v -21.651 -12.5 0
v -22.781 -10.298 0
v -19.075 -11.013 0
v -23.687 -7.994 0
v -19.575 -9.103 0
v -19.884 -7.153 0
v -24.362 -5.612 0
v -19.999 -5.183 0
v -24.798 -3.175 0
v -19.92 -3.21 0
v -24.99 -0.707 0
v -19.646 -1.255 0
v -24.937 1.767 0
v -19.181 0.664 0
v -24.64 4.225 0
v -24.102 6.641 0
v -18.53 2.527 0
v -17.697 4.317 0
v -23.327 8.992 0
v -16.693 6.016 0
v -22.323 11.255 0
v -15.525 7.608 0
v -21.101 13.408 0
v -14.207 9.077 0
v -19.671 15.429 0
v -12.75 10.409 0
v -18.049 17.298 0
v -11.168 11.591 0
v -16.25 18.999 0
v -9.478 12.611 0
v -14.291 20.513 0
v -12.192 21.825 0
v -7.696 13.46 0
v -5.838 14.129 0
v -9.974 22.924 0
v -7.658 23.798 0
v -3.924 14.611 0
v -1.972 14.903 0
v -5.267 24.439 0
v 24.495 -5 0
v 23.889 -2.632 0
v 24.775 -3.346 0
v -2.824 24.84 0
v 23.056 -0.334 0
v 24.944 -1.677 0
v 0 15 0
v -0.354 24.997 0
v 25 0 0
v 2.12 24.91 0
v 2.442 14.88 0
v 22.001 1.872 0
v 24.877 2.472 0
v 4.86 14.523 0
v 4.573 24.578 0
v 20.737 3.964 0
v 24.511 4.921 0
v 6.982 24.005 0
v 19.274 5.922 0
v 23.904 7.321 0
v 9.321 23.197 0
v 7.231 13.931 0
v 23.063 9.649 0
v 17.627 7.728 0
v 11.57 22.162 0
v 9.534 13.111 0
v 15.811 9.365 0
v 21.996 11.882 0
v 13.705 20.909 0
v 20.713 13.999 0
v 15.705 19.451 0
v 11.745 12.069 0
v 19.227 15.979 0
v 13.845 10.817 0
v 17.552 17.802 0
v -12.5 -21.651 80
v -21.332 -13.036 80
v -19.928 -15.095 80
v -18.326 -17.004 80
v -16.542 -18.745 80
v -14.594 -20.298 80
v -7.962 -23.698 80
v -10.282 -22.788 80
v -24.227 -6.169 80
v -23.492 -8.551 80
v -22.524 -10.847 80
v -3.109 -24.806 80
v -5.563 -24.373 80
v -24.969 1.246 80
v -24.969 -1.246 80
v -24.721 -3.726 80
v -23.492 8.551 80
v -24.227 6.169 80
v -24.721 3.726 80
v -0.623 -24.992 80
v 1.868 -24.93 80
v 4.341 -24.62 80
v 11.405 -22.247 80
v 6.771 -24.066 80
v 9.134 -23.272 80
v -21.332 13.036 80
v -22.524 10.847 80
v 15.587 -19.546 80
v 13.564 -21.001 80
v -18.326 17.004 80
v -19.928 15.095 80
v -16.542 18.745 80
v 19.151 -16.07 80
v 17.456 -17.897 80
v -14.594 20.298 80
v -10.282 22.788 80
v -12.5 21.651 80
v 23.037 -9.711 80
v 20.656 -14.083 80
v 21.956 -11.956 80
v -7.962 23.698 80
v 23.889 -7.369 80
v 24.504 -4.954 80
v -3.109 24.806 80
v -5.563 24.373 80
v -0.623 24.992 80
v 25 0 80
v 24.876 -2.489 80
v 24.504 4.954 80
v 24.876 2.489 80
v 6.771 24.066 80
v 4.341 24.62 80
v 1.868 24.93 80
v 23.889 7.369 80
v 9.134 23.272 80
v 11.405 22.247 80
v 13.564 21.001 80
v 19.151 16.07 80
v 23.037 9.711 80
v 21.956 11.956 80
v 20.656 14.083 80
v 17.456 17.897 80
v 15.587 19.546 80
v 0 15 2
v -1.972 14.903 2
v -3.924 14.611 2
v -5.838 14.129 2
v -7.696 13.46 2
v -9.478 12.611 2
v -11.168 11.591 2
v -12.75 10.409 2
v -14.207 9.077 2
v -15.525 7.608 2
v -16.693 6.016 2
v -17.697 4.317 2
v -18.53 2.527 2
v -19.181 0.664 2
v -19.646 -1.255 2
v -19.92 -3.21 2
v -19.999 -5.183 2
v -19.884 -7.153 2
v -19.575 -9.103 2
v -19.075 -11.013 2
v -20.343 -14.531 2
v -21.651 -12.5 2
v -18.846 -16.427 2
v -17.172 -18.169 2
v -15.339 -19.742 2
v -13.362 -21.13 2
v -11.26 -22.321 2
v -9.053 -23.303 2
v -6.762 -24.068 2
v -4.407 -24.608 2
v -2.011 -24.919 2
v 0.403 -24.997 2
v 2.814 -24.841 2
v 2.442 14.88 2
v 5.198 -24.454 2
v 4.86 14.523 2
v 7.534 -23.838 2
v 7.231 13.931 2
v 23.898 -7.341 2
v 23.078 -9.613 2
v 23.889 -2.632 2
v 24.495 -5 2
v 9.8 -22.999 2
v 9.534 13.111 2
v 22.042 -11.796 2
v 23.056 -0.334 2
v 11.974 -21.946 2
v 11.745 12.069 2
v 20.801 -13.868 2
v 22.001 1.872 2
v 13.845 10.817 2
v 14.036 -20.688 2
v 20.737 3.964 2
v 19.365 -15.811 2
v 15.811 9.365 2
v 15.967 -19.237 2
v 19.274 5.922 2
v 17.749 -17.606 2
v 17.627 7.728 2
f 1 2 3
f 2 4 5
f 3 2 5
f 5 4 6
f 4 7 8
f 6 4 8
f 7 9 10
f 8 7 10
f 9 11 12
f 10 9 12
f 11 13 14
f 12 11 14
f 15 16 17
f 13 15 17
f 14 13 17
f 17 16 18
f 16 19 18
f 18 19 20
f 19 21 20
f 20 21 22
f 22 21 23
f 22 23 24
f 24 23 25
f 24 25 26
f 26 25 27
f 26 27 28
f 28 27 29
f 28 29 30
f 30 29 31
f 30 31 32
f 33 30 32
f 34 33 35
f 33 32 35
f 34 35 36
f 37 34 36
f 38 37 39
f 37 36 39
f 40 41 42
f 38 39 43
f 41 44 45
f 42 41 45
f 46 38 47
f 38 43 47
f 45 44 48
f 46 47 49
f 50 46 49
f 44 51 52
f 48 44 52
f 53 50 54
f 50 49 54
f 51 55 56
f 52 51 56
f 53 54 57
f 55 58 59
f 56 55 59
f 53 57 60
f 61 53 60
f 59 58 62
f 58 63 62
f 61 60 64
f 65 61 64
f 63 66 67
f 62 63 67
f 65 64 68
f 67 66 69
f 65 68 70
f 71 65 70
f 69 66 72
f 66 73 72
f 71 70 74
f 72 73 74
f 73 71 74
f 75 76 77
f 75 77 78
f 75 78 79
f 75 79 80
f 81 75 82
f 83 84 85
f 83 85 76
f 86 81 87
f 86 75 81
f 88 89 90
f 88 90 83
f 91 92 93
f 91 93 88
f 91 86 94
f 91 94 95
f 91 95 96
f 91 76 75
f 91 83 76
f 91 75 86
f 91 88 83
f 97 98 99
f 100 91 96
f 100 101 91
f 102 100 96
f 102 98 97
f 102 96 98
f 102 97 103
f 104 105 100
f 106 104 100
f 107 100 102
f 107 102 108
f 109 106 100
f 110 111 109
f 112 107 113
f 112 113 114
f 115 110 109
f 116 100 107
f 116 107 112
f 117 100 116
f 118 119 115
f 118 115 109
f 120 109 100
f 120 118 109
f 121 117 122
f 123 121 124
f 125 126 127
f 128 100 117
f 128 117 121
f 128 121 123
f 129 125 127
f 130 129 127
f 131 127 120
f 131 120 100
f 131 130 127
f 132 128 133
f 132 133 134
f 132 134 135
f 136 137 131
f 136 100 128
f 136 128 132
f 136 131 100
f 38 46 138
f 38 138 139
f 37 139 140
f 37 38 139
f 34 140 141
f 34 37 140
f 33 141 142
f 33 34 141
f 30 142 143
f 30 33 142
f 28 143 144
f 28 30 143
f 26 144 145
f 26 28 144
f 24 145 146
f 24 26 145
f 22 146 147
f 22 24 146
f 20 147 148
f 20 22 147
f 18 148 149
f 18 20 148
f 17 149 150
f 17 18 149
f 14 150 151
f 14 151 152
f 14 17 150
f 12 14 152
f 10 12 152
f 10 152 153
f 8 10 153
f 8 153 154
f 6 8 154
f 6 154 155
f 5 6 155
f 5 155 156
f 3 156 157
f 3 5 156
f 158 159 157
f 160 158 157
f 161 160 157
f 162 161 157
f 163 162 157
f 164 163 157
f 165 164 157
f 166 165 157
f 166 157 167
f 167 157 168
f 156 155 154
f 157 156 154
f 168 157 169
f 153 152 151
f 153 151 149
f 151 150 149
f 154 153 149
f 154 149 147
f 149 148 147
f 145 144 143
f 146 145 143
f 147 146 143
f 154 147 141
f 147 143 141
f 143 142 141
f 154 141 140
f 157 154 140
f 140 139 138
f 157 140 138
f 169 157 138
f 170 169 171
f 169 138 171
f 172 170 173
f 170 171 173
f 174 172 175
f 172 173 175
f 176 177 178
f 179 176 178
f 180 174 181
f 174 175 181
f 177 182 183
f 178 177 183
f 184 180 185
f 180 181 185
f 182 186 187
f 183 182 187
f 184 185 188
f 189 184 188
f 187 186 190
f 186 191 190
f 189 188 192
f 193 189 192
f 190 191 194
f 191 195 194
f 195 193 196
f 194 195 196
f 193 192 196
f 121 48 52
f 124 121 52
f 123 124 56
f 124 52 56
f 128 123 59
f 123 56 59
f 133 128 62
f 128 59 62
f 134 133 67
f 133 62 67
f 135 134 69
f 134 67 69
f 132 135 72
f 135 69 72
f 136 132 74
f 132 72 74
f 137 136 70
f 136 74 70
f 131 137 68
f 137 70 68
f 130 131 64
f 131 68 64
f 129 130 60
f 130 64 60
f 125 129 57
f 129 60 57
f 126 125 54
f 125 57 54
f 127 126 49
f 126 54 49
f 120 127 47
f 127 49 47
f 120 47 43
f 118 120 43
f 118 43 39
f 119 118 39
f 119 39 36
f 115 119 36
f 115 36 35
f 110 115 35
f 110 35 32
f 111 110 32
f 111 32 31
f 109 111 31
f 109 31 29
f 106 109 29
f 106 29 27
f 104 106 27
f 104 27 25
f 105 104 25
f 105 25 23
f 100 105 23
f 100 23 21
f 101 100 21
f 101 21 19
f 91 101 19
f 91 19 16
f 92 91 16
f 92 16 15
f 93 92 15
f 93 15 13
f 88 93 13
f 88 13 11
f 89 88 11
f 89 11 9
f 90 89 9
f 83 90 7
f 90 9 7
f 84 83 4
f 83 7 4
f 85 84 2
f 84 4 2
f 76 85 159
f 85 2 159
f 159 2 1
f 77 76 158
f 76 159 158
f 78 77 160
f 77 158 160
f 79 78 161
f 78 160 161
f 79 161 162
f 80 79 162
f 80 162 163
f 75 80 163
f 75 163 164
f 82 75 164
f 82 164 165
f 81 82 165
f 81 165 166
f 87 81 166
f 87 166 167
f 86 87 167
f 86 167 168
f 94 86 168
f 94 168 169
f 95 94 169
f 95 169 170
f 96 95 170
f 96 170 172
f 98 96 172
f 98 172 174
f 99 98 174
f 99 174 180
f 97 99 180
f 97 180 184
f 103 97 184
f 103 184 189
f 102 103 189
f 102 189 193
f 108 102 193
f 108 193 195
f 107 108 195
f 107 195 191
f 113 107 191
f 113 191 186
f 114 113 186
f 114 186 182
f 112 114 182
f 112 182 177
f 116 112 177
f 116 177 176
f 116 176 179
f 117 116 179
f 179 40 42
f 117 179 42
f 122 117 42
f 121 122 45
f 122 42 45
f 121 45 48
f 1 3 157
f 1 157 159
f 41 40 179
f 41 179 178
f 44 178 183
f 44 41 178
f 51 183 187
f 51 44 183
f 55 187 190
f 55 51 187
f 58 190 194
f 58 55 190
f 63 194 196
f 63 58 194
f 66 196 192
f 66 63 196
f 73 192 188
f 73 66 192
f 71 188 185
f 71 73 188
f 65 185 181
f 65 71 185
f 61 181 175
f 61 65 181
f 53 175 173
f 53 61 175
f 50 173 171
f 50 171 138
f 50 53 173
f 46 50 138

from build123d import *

# Parameters (mm, degrees)
SKETCH_1_R          = 25
EXTRUDE_1_DEPTH     = 80
CUT_EXTRUDE_1_DEPTH = 2


with BuildPart() as part:
    # 草图1 → 凸台-拉伸1 (new body)
    with BuildSketch(Plane.XY):
        Circle(SKETCH_1_R)
    extrude(amount=EXTRUDE_1_DEPTH)

    # 草图2 → 切除-拉伸1 (cut)
    with BuildSketch(Plane(origin=(0, 0, 0), x_dir=(-1, 0, 0), z_dir=(0, 0, -1))):
        with BuildLine():
            Line((19.074750083, -11.012812095), (21.650635095, -12.5))
            ThreePointArc((21.650635095, -12.5), (-4.010605572, -24.676203982), (-24.494897428, -5))
            ThreePointArc((-24.494897428, -5), (-15.811388301, 9.364916731), (0, 15))
            ThreePointArc((0, 15), (16.128487869, 6.826744229), (19.074750083, -11.012812095))
        make_face()
    extrude(amount=-CUT_EXTRUDE_1_DEPTH, mode=Mode.SUBTRACT)


solid = part.part
